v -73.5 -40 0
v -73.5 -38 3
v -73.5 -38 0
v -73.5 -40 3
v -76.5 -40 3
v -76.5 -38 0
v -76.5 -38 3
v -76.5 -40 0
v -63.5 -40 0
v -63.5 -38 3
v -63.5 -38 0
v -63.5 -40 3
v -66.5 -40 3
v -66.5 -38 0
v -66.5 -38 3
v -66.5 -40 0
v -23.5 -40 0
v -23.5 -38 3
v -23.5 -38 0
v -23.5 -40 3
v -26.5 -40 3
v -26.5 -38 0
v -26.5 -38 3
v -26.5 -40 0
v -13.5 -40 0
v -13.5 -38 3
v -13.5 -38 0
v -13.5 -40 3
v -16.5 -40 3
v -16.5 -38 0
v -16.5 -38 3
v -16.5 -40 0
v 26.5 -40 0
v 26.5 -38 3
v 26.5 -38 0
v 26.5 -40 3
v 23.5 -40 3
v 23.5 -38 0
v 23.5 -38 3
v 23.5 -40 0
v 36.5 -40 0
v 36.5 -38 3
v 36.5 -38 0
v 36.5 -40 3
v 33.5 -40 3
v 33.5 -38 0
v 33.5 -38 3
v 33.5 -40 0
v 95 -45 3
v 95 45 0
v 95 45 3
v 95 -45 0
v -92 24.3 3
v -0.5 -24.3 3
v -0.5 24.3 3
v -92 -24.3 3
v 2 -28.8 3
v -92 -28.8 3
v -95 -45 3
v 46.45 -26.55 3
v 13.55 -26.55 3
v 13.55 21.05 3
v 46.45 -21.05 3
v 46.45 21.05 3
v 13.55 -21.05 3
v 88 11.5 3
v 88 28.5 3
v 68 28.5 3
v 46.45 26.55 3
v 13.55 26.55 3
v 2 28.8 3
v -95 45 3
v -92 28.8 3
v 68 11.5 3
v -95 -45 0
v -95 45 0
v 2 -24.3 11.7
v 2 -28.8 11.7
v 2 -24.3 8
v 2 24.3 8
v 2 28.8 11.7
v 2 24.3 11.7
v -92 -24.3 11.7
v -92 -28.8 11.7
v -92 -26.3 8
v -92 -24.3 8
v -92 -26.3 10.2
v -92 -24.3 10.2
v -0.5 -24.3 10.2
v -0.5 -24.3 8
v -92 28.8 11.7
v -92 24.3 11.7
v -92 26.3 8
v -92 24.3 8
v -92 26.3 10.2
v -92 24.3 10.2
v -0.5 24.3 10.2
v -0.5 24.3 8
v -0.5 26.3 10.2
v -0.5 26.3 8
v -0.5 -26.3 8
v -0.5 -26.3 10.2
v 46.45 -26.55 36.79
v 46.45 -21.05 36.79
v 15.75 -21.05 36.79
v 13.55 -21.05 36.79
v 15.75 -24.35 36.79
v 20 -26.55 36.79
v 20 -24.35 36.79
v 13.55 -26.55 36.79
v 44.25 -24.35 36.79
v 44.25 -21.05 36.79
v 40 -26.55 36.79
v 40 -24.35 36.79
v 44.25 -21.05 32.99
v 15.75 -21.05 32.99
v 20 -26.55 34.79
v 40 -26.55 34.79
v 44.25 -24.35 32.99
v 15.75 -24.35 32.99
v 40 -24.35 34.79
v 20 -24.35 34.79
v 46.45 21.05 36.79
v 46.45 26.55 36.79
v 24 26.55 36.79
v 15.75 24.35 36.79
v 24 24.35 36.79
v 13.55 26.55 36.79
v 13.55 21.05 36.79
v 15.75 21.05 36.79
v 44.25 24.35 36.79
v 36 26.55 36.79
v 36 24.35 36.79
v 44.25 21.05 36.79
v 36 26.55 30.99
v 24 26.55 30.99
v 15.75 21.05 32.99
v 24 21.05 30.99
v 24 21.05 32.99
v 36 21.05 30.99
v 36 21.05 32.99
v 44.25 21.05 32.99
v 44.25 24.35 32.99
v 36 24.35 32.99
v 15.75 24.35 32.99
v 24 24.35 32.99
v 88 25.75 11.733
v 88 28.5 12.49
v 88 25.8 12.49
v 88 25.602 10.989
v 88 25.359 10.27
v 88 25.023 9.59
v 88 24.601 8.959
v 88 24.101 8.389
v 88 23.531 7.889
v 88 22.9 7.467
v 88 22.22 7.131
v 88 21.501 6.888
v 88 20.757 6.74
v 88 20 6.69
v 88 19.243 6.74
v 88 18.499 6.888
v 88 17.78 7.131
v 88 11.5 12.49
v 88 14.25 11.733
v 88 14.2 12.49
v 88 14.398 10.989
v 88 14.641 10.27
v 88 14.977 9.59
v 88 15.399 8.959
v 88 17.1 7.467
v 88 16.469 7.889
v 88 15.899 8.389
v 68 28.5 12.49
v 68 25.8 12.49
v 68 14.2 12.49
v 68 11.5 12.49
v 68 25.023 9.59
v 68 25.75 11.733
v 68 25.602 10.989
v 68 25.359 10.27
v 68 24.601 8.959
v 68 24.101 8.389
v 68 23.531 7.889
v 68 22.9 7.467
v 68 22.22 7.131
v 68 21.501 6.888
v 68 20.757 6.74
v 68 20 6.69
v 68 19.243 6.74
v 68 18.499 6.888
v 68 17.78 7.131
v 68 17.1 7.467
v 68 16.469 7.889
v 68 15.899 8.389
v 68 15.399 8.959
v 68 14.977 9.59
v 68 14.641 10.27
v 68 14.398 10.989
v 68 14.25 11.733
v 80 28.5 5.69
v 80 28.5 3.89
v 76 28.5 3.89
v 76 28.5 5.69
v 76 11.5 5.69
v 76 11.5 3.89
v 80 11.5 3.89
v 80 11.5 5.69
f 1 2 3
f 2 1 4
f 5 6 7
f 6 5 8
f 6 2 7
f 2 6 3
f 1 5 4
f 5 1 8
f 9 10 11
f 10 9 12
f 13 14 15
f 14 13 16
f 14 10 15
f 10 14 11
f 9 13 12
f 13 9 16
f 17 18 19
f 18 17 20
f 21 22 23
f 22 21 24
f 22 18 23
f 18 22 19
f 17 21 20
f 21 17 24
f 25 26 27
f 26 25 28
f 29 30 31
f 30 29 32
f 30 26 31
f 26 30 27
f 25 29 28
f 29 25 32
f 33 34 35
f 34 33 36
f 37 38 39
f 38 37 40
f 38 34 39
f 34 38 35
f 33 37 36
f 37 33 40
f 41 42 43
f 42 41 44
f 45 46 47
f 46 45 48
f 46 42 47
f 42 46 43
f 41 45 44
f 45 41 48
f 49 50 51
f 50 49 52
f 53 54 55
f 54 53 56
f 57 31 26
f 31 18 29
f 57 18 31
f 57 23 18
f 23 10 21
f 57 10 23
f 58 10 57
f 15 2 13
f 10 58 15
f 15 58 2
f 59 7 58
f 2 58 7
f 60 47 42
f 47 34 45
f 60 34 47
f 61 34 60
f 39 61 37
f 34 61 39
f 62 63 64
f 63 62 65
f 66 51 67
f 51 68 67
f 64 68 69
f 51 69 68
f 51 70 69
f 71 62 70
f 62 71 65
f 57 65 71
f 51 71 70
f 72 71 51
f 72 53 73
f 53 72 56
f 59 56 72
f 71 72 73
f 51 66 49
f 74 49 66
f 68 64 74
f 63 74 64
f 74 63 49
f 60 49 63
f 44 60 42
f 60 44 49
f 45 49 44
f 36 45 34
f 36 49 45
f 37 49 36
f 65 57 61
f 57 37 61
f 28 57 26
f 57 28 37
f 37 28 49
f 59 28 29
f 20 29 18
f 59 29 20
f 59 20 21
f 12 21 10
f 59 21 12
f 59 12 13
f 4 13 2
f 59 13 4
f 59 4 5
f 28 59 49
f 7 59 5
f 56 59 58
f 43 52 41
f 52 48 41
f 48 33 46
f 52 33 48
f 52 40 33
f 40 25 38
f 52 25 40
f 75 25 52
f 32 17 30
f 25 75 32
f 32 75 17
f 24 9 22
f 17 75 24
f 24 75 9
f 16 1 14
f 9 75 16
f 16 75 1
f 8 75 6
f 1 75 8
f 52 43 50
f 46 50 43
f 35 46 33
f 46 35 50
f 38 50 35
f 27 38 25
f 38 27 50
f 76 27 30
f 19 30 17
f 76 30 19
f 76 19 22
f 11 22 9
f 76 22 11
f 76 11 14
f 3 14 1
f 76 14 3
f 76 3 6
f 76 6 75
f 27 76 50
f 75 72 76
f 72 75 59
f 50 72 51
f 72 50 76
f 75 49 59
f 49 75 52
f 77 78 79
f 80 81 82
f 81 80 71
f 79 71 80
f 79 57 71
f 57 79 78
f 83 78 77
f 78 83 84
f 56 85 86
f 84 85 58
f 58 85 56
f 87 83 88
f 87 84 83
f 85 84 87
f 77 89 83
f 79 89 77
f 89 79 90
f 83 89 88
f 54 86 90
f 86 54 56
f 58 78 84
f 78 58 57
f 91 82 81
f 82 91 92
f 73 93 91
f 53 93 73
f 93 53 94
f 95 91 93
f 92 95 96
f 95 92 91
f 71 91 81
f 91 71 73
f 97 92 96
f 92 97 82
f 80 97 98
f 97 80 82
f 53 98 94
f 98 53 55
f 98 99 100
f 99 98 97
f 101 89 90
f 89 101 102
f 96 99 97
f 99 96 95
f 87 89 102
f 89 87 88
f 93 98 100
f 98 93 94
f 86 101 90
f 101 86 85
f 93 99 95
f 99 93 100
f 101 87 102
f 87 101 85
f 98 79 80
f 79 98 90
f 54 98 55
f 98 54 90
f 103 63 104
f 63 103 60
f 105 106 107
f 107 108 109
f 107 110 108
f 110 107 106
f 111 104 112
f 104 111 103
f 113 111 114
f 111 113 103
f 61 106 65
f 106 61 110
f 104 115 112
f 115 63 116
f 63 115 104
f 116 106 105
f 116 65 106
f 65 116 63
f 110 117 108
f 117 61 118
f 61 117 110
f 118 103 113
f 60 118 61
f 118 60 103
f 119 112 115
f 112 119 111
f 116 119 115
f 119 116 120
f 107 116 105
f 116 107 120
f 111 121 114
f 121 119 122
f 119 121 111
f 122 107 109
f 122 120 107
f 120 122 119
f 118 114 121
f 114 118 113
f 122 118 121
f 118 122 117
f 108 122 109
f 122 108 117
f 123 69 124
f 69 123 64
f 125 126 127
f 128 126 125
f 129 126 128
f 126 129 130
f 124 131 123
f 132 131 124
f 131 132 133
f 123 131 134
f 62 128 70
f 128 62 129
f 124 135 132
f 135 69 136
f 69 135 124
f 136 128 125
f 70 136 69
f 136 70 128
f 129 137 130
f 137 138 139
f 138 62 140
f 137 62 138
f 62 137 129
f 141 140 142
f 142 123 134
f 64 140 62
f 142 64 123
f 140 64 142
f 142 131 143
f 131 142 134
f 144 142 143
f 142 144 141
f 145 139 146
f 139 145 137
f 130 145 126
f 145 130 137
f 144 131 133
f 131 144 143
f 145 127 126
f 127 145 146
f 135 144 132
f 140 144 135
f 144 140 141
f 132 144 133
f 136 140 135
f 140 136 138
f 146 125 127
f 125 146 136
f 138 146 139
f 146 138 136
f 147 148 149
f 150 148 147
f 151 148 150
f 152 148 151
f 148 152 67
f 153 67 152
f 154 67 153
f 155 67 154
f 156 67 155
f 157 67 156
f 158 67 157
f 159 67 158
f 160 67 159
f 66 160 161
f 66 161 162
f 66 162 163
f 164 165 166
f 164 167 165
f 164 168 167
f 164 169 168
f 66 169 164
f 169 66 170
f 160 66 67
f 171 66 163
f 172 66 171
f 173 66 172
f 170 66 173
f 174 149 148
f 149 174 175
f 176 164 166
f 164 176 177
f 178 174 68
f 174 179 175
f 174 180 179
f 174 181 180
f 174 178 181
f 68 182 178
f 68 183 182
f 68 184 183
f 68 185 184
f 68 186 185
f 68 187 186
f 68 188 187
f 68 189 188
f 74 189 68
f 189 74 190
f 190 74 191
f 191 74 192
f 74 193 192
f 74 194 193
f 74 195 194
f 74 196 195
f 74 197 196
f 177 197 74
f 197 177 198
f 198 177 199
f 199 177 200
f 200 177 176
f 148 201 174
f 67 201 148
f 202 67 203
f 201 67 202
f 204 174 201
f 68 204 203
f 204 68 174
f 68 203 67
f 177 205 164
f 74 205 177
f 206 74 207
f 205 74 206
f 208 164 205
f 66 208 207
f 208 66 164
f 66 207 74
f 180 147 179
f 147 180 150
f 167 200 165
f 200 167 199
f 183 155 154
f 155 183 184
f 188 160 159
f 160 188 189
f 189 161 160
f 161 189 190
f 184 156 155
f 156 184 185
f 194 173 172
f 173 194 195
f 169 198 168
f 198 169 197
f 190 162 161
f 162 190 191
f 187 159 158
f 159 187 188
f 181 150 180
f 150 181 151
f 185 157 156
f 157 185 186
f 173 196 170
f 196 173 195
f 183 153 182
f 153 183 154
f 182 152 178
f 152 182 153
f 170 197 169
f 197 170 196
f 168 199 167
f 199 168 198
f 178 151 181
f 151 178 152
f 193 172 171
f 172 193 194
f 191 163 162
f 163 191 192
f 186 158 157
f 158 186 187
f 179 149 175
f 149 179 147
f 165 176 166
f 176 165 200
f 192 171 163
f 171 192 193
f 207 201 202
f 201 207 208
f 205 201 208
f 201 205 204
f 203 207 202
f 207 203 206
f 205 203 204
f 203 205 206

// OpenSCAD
// file: lib.scad
// 공통 도형. include <config.scad> 뒤에 include 하세요.

module slot2d(L, W) {           // 긴 방향이 Y인 둥근 직사각형
    hull() {
        translate([0, -(L - W)/2]) circle(d = W);
        translate([0,  (L - W)/2]) circle(d = W);
    }
}

module sector2d(a0, a1, R) {
    polygon(concat([[0, 0]], [for (a = [a0 : 5 : a1]) [R*cos(a), R*sin(a)]], [[R*cos(a1), R*sin(a1)]]));
}

// JGA25-370 축: 한쪽만 깎인 D컷 (깎인 면이 +X)
module dshaft_jga2d(c) {
    r = jga_shaft_d/2;
    intersection() {
        circle(d = jga_shaft_d + 2*c);
        translate([-r - c, -r - c]) square([jga_shaft_flat + 2*c, jga_shaft_d + 2*c]);
    }
}

// 28BYJ-48 축: 양쪽이 깎인 D컷
module dshaft_byj2d(c) {
    intersection() {
        circle(d = byj_shaft_d + 2*c);
        square([byj_shaft_flat + 2*c, byj_shaft_d * 2], center = true);
    }
}

// 가로로 뚫는 구멍용 물방울 모양 (뾰족한 쪽이 +Y → 출력 시 위쪽)
module teardrop2d(d) {
    union() {
        circle(d = d);
        polygon([[-d/2*cos(45), d/2*sin(45)], [0, d/2/sin(45)], [d/2*cos(45), d/2*sin(45)]]);
    }
}

// 꼭대기를 잘라 낸 물방울 (얇은 벽을 뚫지 않게)
module teardrop_flat2d(d, cap) {
    intersection() {
        teardrop2d(d);
        translate([-d, -d]) square([2*d, d + d/2 + cap]);
    }
}

module m3_nut_pocket(h) {        // 세로 육각 주머니
    cylinder(d = m3_nut_af / cos(30), h = h, $fn = 6);
}

// 옆에서 너트를 밀어 넣는 홈: +X 방향으로 열림
module m3_nut_slot(len) {
    hull() {
        m3_nut_pocket(m3_nut_t);
        translate([len, 0, 0]) m3_nut_pocket(m3_nut_t);
    }
}

module slotted_hole(d, len, h) { // X 방향 긴 구멍
    hull() {
        translate([-len/2, 0, 0]) cylinder(d = d, h = h);
        translate([ len/2, 0, 0]) cylinder(d = d, h = h);
    }
}
// file: config.scad
// =====================================================================
// 루틴 디스펜서 v2 (8칸: 가루 4 + 알약 4) · 공통 치수
// ---------------------------------------------------------------------
// 모든 부품 파일이 이 파일을 include 합니다. 숫자는 여기서만 고치세요.
// ★ = 추정치. 부품이 도착하면 측정표대로 재서 바꿉니다.
// 좌표: X 왼→오, Y 앞→뒤, Z 아래→위 (mm). 원점은 두 스테이션 사이, 바닥판 윗면 높이.
// 왼쪽 = 가루 스테이션, 오른쪽 = 알약 스테이션
// =====================================================================

$fn = 48;

// ---- 프린터 공차 (공차 쿠폰으로 확정) --------------------------------
clear      = 0.3;    // 끼워 맞춤 한쪽 여유 (쿠폰 C줄 3번으로 확정)
byj_d_clear = 0.15;  // 28BYJ 축 ↔ 원판 D구멍 여유 (쿠폰 B줄 4번으로 확정)
jga_d_clear = 0.15;  // ★ JGA 축 ↔ 스크류 허브 D구멍 여유 (쿠폰 J줄, 모터 오면 확정)
m3_hole    = 3.4;    // ★ M3 나사가 헐겁게 지나가는 구멍
m3_nut_af  = 5.8;    // ★ M3 너트 맞변 거리 + 여유 (육각 주머니)
m3_nut_t   = 2.7;    // ★ M3 너트 두께 + 여유
m3_head_d  = 6.2;    // 렌치볼트 머리 지름 + 여유
auger_gap  = 0.5;    // 스크류 날개 ↔ 관 벽 한쪽 틈. 스크류 지름만 바뀜 (관 16 고정)
                     // 좁히면 덜 새지만 가루가 끼어 모터가 멈출 수 있음. 가루 시험 전엔 0.5 유지

// ---- 나사 대신 쓰는 것 ------------------------------------------------
// 핀: 출력한 작은 원기둥. 구멍에 떨어뜨려 넣고 부품을 얹으면 자리가 잡힘 (무게로 눌림)
pin_d   = 4;
pin_len = 6.5;
pin_hole = pin_d + 2*clear;
// 기둥 끝 네모 돌기: 바닥판·상판의 네모 구멍에 끼움
peg_w = 6;  peg_h = 4;
peg_hole = peg_w + 2*clear;

// ---- 가루 모터: JGA25-370 6V 77RPM (상품 치수도 기준) ------------------
jga_gear_d    = 25;    // 감속기 지름 (치수도)
jga_gear_len  = 23;    // 감속기 길이 — 77RPM 은 23 (치수도 표)
jga_motor_d   = 24.4;  // 모터 몸통 지름 (치수도)
jga_motor_len = 30.8;  // 모터 몸통 길이 (치수도)
jga_term_len  = 4;     // 뒤쪽 단자 (치수도)
jga_shaft_d   = 4;     // 축 지름 (치수도)
jga_shaft_flat= 3.5;   // 축 D컷 (치수도)
jga_shaft_len = 11.5;  // 감속기 앞면 → 축 끝 (치수도)
jga_boss_d    = 7;     // 앞면 돌기 (치수도)
jga_boss_h    = 2.5;   // (치수도)
jga_len       = jga_gear_len + jga_motor_len + jga_term_len;

// ---- 알약 모터: 28BYJ-48 --------------------------------------------
// 출처: 제조사 도면 (components101 28BYJ-48 dimensions) + 사용자 실측 (2026-10-04)
byj_body_d    = 28;    // 도면 Ø28
byj_body_h    = 19.4;  // 실측 19.4 (도면 19)
byj_ear_span  = 35;    // 도면 35±0.2, 실측 (안쪽 벽 + 바깥쪽 벽) / 2 로 확인
byj_ear_hole  = 4.2;   // 도면 Ø4.2
byj_shaft_off = 8;     // 도면: 몸통 중심 → 축 8
byj_shaft_d   = 5;     // 도면 Ø5
byj_shaft_flat= 3;     // 도면: 양쪽 D컷 폭 3
byj_shaft_len = 8.5;   // 도면: 몸통 윗면 → 축 끝 10, 돌기 1.5 → 돌기 윗면에서 8.5
byj_flat_len  = 6;     // 도면: D컷 길이 6 (축 끝에서부터). 그 아래는 둥근 축
byj_ear_t     = 0.8;   // 고정 귀 두께 (도면에 없음, 설계에서 안 씀)
byj_boss_d    = 9;     // 도면 Ø9
byj_boss_h    = 1.5;   // 도면 1.5
byj_cover_w   = 14.6;  // 도면: 파란 전선 덮개 폭
byj_cover_r   = 17;    // 도면: 몸통 중심 → 덮개 끝 17 (실측: 몸통 밖으로 3)
byj_conn_w    = 15;    // 실측: 흰색 커넥터(JST XH 5핀) 폭
byj_conn_t    = 5.5;   // 실측: 두께
byj_conn_l    = 8;     // 실측: 길이 (전선 방향)

// ---- 로드셀 1kg (VLT-LCS002, 상품 치수도 기준) ------------------------
lc_l      = 80;        // 치수도
lc_w      = 12.7;      // 치수도
lc_h      = 12.7;      // 치수도
lc_holes  = [5, 20];   // 양 끝에서 구멍까지 (치수도: 15 간격, 안쪽 40 간격)
// 전선이 나오는 끝 = M5 두 개 = 고정 끝(받침). 반대 끝 = M4 두 개 = 쟁반.
lc_fix_bolt_d  = 5.5;  lc_fix_head_d  = 9.2;  lc_fix_head_h  = 5.8;   // M5x15 (머리 자리 천장이 처져도 머리가 안 튀어나오게 0.8 여유)
lc_load_bolt_d = 4.5;  lc_load_head_d = 7.6;  lc_load_head_h = 4.2;   // M4x12

// ---- 컵 (다이소, 미정) ------------------------------------------------
cup_bottom_d = 55;     // ★ 바닥 지름
cup_top_d    = 75;     // ★ 입구 지름 (가루 출구 4개가 이 안에 떨어져야 함)
cup_h        = 75;     // ★ 높이
function cup_d_at(h) = cup_bottom_d + (cup_top_d - cup_bottom_d) * h / cup_h;

// ---- 알약 -------------------------------------------------------------
// 최대 알약: 모듈 몸체(치마·바닥·덮개·알약 상판 미끄럼관)를 이 크기로 만듦. 한 번만 뽑음.
pill_max_l = 26;       // ★ 오메가3 1000mg 연질캡슐급 (흔히 약 25 × 10~11)보다 조금 크게
pill_max_w = 11;       // ★
pill_max_t = 11;       // ★ 연질캡슐은 단면이 둥글어서 두께 = 폭
// 칸에 넣을 알약: 원판 칸·원판 두께·받침판을 이 크기로 만듦. 알약을 바꾸면 원판·받침판만 다시 뽑음.
pill_l = 18.2;         // 실측: 종근당 멀티비타민 길이
pill_w = 9.2;          // 실측: 폭
pill_t = 5.9;          // 실측: 누웠을 때 두께

// ---- 전자부품 ----------------------------------------------------------
pb_w = 89;  pb_d = 52; pb_t = 1.6;       // 만능기판 (상품명 치수) · 두께 ★
esp_w = 48.1; esp_d = 27.9; esp_t = 1.8; // ESP32 DevKitC 호환 (실측: 기판 길이 · 폭 · 두께)
esp_ant = 55.3 - esp_w;                    // 안테나가 기판 끝(-Y) 밖으로 튀어나온 길이 (실측 전체 55.3)
dcj_d = 11;  dcj_l = 30;                 // ★ DC 잭 몸통 지름·길이
uln_w = 35;  uln_d = 33; uln_t = 1.6;    // ULN2003 보드 (상품 설명 35×33) · 두께 ★
mcp_w = 55;  mcp_d = 32; mcp_t = 1.6;    // ★ MCP23017 보드
hx_w  = 35;  hx_d  = 21; hx_t  = 1.6;    // ★ HX711 보드
hall_w = 4.2; hall_l = 3.2; hall_t = 1.6; // ★ 49E 홀 센서 알맹이 (TO-92S). KY-035 보드에서 떼어 다리에 단선 납땜
mag_d = 8;   mag_t = 3;                  // 원판 원점 자석 (ND 8Ø×3t)

// ---- 뼈대 (스테이션마다 바닥판 + 상판 + 기둥) ------------------------
base_t   = 6;          // 바닥판 두께 (아랫면에 너트 주머니)
deck_t   = 5;          // 상판 두께
deck_z   = 120;        // 상판 아랫면 높이
deck_top = deck_z + deck_t;
rim_h    = 6;          // 상판 테두리 (아래로)
rim_w    = 3;
post_w   = 14;

cupP  = [-110, 0];     // 가루 스테이션 중심 = 가루 컵 중심
cupL  = [ 105, 0];     // 알약 스테이션 중심 = 알약 컵 중심
sizeP = [210, 210];    // 가루 스테이션 판 크기
sizeL = [205, 205];    // 알약 스테이션 판 크기
// 기둥: 모듈 발판·모터 아래를 피하고, 앞쪽(-Y)은 컵을 꺼내는 길이라 비움
postsP = [for (p = [[-93,-45],[93,-45],[-93,45],[93,45],[-93,0],[93,0],[0,93]]) [cupP[0]+p[0], cupP[1]+p[1]]];
postsL = [for (p = [[-92,-92],[92,-92],[-92,92],[92,92],[-92,0],[92,0],[0,92]]) [cupL[0]+p[0], cupL[1]+p[1]]];
ctrl_c    = [cupL[0], cupL[1] + sizeL[1]/2 + 50];   // 제어함 (알약 스테이션 뒤, 탁자 위)
ctrl_size = [190, 90];

// ---- 배치 --------------------------------------------------------------
powder_d   = 13;                 // 컵 중심 → 가루 모듈 출구 끝면
powder_a   = [45, 135, 225, 315];// 가루 모듈 방향 (X자)
pill_s     = 51;                // 알약 모듈 중심의 X·Y 거리 (2×2)

// ---- 출력 영역 (Ender-3 SE) ------------------------------------------
bed = [220, 220, 250];
// main file
// =====================================================================
// 전자부품 받침
//   ctrl_plate  제어판 (알약 스테이션 뒤, 탁자 위): 만능기판 + ESP32 + DC 잭을 한 판에
//   board_tray  작은 보드 받침 (ULN2003 ×4, MCP23017 → 알약 바닥판 / HX711 → 가루 바닥판, 바닥판에 붙어 있음)
// 나사 없음: 제어판은 한 판으로 출력, 작은 보드 받침은 바닥판과 한 덩어리.
// =====================================================================
include <config.scad>
include <lib.scad>

part = "ctrl";   // "ctrl" | "uln" | "mcp" | "hx" | "all"

wall   = 2.5;
lift   = 4;      // 보드 아랫면 높이 (납땜 자국 여유)
ledge  = 1.5;    // 보드 가장자리를 받치는 턱 폭

// ---- 알약 바닥판 위 배치 (알약 컵 기준) ----
uln_rel = [[62, 62], [-62, 62], [-62, -62], [62, -62]];   // pill_phi 45,135,225,315 모듈 아래
mcp_rel = [0, 62];
hx_rel  = [-55, 55];                                      // 가루 컵 기준

// 작은 보드 받침: 바닥판과 한 덩어리로 출력. 가장자리 턱 위에 보드, 짧은 두 변은 열려 있음(커넥터·핀).
// 보드는 케이블 타이 하나로 묶음: 받침 양옆 바닥판 구멍 → 바닥판 아랫면 홈 → 보드 위.
module board_tray(w, d, t) {
    ow = w + 2*clear; od = d + 2*clear;
    difference() {
        translate([-ow/2, -od/2 - wall, 0]) cube([ow, od + 2*wall, lift + t + 1.2]);
        translate([-ow/2 - 1, -od/2, lift]) cube([ow + 2, od, t + 5]);                          // 보드 자리
        translate([-ow/2 - 1, -od/2 + ledge, 1.5]) cube([ow + 2, od - 2*ledge, lift]);            // 납땜 자국 자리
    }
}
// 바닥판에서 파낼 것 (z=0 = 바닥판 윗면)
module board_tray_cut(w, d) {
    od = d + 2*clear;
    for (s = [-1, 1]) translate([-2.5, s * (od/2 + wall + 1.5) - 1.25, -base_t - 1]) cube([5, 2.5, base_t + 2]);
    translate([-2.5, -(od/2 + wall + 3), -base_t - 0.01]) cube([5, od + 2*wall + 6, 1.6]);
}

// ---- 제어판 ----
plate_t = 3;
pb_at   = [-45, 0];       // 제어판 기준
esp_at  = [30, 0];        // ESP32 는 세로로 (USB 가 +Y = 뒤쪽 가장자리)
dcj_at  = [78, 20];       // DC 잭은 +X 가장자리로 꽂음
groove_z = plate_t + 5;   // 만능기판 아랫면 높이
groove_d = 2;
esp_h   = 30;             // ESP32 아랫면 높이: 핀(약 8) + 점퍼 암 커넥터(14) + 굽힘 여유

module pb_holder() {       // 긴 두 변 홈에 밀어 넣음 (-X 쪽으로 넣고 +X 끝에서 멈춤)
    ow = pb_w + 2*wall; od = pb_d + 2*clear;
    difference() {
        union() for (s = [-1, 1]) translate([-ow/2, s > 0 ? od/2 - groove_d : -od/2 - wall, 0])
            cube([ow, wall + groove_d, groove_z + pb_t + 2*clear + 1.5]);
        translate([-ow/2 - 1, -od/2, groove_z]) cube([ow - wall + 1, od, pb_t + 2*clear]);
        translate([-ow/2 - 1, -od/2 + groove_d, groove_z]) cube([ow + 2, od - 2*groove_d, 20]);
    }
    translate([ow/2 - wall, -od/2 - wall, 0]) cube([wall, od + 2*wall, groove_z]);   // 끝 멈춤 (보드 아래까지만)
}

module esp_cradle() {      // 짧은 두 끝만 받침, 긴 두 변은 열림 → 점퍼를 먼저 꽂고 올려놓음
    L = esp_d; W = esp_w;  // 세로로 놓음: X 폭 = esp_d, Y 길이 = esp_w
    for (s = [-1, 1]) difference() {
        translate([-L/2 - wall, s > 0 ? W/2 - 3 : -W/2 - wall, 0]) cube([L + 2*wall, 3 + wall, esp_h + esp_t + 2]);
        translate([-L/2 - clear, -W/2 - clear, esp_h]) cube([L + 2*clear, W + 2*clear, 10]);
        if (s > 0) translate([-6, W/2 - 5, esp_h - 2]) cube([12, 10, 10]);    // USB 자리
        if (s < 0) translate([-10, -W/2 - esp_ant - 1, esp_h + esp_t]) cube([20, esp_ant + 2, 10]);   // 안테나 자리 (기판 윗면 위로 튀어나옴)
    }
}

module dcj_clamp() {
    difference() {
        union() {
            translate([-10, -(dcj_d/2 + 3), 0]) cube([20, dcj_d + 6, dcj_d/2 + 4]);
        }
        translate([-11, 0, dcj_d/2 + 4]) rotate([0, 90, 0]) cylinder(d = dcj_d + 2*clear, h = 22);
        translate([-2, -(dcj_d/2 + 4), 0.9]) cube([4, dcj_d + 8, 1.8]);   // 케이블 타이 홈
    }
}

module ctrl_plate() {
    difference() {
        translate([-ctrl_size[0]/2, -ctrl_size[1]/2, 0]) cube([ctrl_size[0], ctrl_size[1], plate_t]);
        // 케이블 타이 구멍: 제어판 앞 가장자리 (스테이션 쪽 전선 다발)
        for (x = [-70, -20, 30]) for (dx = [-5, 5]) translate([x + dx - 1.5, -ctrl_size[1]/2 + 5, -1]) cube([3, 2, plate_t + 2]);
    }
    translate([pb_at[0], pb_at[1], 0]) pb_holder();
    translate([esp_at[0], esp_at[1], plate_t - 0.01]) esp_cradle();
    translate([dcj_at[0], dcj_at[1], plate_t - 0.01]) dcj_clamp();
}

// ---- 바닥판에 붙는 받침 (frame.scad 가 씀) ----
module pill_boards(cut = false) {
    for (r = uln_rel) translate([cupL[0] + r[0], cupL[1] + r[1], 0])
        if (cut) board_tray_cut(uln_w, uln_d); else board_tray(uln_w, uln_d, uln_t);
    translate([cupL[0] + mcp_rel[0], cupL[1] + mcp_rel[1], 0])
        if (cut) board_tray_cut(mcp_w, mcp_d); else board_tray(mcp_w, mcp_d, mcp_t);
}
module powder_boards(cut = false) translate([cupP[0] + hx_rel[0], cupP[1] + hx_rel[1], 0])
    if (cut) board_tray_cut(hx_w, hx_d); else board_tray(hx_w, hx_d, hx_t);
module boards_placed() { pill_boards(); powder_boards(); }
module ctrl_placed() translate([ctrl_c[0], ctrl_c[1], -base_t]) ctrl_plate();

module electronics_all() {
    boards_placed();
    ctrl_placed();
}

if      (part == "ctrl") ctrl_plate();
else if (part == "uln")  board_tray(uln_w, uln_d, uln_t);
else if (part == "mcp")  board_tray(mcp_w, mcp_d, mcp_t);
else if (part == "hx")   board_tray(hx_w, hx_d, hx_t);
else if (part == "all")  electronics_all();
